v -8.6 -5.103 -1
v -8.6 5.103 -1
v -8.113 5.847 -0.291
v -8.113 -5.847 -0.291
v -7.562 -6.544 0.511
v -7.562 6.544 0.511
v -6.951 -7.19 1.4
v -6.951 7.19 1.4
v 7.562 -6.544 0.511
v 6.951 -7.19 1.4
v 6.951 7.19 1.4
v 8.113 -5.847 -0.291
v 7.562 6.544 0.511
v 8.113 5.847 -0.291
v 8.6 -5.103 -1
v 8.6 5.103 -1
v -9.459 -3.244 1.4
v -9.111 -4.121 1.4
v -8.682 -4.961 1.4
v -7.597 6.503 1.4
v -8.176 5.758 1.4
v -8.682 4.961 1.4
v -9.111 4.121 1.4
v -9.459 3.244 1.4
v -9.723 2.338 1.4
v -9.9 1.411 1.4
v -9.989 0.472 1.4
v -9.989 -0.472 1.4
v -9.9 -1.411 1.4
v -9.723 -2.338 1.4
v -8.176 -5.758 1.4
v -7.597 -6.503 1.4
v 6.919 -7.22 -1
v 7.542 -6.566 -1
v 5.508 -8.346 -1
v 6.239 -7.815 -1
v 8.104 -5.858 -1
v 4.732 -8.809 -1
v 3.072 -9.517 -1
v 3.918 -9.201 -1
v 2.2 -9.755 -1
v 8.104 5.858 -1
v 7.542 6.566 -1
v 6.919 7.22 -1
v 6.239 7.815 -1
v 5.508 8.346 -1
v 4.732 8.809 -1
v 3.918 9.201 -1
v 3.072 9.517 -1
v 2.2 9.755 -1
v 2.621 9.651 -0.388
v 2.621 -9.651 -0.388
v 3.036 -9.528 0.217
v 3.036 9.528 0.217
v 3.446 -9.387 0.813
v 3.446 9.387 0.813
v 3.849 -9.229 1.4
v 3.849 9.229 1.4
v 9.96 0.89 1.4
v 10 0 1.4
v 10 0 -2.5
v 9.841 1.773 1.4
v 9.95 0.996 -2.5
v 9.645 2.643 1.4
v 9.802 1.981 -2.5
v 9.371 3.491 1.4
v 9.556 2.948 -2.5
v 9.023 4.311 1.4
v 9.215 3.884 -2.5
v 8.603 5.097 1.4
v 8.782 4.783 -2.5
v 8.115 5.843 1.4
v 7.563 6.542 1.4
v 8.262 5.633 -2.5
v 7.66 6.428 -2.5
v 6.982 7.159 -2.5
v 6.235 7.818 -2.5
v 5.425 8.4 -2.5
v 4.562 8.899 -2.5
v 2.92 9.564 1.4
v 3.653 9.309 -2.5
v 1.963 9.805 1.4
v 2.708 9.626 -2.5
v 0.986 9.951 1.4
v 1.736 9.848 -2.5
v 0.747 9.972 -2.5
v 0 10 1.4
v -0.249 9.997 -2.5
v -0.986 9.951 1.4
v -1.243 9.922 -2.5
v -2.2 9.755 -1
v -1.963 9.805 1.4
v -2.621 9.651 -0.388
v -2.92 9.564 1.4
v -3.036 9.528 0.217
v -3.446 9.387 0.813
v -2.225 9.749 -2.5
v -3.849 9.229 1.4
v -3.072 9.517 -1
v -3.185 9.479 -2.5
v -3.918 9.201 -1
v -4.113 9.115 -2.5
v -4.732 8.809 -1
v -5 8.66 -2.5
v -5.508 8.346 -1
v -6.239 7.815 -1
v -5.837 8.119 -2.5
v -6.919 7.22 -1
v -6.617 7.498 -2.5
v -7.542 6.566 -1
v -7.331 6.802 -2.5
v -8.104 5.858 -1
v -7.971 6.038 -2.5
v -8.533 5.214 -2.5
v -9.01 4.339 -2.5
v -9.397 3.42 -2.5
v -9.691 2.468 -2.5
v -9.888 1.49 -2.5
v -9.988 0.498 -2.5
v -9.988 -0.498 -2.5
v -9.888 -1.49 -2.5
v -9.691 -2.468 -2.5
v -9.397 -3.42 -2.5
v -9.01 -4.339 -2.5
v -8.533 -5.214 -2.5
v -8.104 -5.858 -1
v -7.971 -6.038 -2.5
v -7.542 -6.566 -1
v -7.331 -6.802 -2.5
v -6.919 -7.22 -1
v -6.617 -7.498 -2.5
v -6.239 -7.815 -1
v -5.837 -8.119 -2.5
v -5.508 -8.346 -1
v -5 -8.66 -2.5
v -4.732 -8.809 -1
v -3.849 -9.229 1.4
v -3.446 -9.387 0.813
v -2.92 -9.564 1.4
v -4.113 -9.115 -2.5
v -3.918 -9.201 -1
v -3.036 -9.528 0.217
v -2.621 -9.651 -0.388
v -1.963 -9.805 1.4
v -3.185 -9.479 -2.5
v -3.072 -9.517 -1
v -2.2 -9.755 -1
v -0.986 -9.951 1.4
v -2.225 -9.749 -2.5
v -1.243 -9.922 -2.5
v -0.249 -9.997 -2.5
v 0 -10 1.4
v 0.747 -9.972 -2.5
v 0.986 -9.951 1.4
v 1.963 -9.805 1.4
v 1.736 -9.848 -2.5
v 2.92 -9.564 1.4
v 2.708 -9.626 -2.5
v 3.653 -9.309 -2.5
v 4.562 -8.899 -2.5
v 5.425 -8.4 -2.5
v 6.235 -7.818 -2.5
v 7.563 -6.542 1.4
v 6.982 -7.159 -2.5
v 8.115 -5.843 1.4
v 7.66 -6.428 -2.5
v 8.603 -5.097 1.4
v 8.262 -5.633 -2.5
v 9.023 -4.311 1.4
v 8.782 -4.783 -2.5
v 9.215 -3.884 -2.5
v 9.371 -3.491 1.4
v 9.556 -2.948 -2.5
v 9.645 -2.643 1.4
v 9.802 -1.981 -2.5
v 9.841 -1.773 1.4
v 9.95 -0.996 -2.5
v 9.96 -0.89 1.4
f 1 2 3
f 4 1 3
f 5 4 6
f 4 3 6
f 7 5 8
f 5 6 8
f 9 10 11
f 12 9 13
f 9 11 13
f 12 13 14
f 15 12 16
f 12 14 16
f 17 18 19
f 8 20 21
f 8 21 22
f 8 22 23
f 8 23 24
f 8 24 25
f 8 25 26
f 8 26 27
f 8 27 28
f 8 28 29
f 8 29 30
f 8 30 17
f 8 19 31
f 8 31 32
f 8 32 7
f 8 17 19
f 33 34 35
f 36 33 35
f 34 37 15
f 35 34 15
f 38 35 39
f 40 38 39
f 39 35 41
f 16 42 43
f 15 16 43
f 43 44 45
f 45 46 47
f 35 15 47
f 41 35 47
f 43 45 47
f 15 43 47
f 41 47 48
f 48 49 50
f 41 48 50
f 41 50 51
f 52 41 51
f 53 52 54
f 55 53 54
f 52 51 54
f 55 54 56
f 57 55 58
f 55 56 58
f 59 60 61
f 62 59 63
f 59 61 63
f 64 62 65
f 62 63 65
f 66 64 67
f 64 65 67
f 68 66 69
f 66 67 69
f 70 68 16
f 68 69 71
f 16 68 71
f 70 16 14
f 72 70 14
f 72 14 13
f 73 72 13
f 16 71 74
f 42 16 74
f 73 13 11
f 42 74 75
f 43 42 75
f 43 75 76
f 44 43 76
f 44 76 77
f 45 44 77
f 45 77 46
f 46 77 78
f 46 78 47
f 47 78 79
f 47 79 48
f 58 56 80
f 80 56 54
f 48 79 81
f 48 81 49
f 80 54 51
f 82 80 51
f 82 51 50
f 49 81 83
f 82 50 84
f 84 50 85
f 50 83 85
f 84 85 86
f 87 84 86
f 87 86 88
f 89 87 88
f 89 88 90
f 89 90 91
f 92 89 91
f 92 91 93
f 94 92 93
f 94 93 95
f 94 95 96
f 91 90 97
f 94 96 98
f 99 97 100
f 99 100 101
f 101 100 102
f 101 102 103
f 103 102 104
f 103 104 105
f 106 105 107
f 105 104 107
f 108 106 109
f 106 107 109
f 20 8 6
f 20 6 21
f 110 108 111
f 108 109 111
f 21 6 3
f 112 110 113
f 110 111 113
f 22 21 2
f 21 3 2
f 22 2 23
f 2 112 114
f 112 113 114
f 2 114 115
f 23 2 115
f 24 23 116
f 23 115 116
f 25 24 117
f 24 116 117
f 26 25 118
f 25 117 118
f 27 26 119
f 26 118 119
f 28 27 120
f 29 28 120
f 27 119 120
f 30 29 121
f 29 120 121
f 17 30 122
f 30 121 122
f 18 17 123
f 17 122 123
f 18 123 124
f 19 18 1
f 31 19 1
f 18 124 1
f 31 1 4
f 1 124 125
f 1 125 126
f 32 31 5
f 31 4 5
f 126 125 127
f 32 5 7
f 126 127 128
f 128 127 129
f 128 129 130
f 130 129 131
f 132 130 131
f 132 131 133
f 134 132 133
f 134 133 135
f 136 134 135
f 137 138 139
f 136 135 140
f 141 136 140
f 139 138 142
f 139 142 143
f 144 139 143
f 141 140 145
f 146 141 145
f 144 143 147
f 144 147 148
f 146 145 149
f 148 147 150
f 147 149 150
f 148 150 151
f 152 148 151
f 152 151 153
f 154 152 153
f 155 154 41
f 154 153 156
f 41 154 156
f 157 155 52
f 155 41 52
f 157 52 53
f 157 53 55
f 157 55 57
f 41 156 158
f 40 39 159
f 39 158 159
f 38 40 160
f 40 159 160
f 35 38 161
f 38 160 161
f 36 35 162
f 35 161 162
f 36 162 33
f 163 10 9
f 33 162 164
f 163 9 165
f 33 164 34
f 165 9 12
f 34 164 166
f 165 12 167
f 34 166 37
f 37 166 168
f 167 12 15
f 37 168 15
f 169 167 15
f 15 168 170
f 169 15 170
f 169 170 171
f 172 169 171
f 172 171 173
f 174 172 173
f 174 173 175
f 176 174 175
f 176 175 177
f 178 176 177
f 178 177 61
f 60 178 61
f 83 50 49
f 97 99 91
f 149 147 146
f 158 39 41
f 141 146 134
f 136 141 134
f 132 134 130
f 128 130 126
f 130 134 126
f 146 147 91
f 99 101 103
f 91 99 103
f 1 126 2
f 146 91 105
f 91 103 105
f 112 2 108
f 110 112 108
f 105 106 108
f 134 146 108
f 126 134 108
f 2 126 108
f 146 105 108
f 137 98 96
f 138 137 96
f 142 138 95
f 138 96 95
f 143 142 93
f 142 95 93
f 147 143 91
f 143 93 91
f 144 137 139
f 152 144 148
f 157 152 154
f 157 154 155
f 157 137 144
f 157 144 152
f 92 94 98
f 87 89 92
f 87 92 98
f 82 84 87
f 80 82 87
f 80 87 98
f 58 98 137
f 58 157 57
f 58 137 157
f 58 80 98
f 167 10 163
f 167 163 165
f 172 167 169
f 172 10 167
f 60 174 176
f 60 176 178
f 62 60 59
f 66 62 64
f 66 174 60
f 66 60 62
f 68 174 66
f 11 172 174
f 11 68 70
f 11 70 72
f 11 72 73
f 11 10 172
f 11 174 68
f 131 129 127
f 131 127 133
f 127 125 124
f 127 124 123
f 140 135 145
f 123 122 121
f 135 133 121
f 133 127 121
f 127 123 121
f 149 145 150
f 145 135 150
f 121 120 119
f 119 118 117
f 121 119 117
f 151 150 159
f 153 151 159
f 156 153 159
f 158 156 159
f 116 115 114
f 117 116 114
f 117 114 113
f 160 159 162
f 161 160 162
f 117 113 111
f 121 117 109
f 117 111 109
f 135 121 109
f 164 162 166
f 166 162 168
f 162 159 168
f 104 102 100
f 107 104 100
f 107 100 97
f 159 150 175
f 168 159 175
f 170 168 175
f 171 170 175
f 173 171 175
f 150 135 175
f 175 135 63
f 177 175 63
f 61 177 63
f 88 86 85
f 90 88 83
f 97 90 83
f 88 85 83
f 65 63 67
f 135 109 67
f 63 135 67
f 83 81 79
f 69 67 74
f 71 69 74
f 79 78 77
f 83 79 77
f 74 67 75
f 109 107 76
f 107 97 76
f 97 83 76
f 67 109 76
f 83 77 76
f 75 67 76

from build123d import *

# Parameters (mm, degrees)
F0_R     = 10
F1_DEPTH = 3.9
F4_DEPTH = 25
F5_DEPTH = 25


with BuildPart() as f1:
    # F0 (on Top) → F1 (new body)
    with BuildSketch(Plane.XY):
        Circle(F0_R)
    extrude(amount=F1_DEPTH)


with BuildPart() as f1_1:
    # F3: moved
    add(f1.part.moved(Location((0, 0, -2.5))))

    # F2 (on Front) → F4 (cut)
    with BuildSketch(Plane.XZ):
        Polygon((-2.2, -1), (-3.849474, 1.4), (-6.950526, 1.4), (-8.6, -1), align=None)
        Polygon((8.6, -1), (6.950526, 1.4), (3.849474, 1.4), (2.2, -1), align=None)
    extrude(amount=-F4_DEPTH, mode=Mode.SUBTRACT)

    # F4_face (on face) → F5 (cut)
    with BuildSketch(Plane(origin=(5.4, 0, 0.061112), x_dir=(1, 0, 0), z_dir=(0, 1, 0))):
        Polygon((1.550526, -1.338888), (3.2, 1.061112), (-3.2, 1.061112), (-1.550526, -1.338888), align=None)
        Polygon((-14, 1.061112), (-12.350526, -1.338888), (-9.249474, -1.338888), (-7.6, 1.061112), align=None)
    extrude(amount=-F5_DEPTH, mode=Mode.SUBTRACT)


solid = f1_1.part
